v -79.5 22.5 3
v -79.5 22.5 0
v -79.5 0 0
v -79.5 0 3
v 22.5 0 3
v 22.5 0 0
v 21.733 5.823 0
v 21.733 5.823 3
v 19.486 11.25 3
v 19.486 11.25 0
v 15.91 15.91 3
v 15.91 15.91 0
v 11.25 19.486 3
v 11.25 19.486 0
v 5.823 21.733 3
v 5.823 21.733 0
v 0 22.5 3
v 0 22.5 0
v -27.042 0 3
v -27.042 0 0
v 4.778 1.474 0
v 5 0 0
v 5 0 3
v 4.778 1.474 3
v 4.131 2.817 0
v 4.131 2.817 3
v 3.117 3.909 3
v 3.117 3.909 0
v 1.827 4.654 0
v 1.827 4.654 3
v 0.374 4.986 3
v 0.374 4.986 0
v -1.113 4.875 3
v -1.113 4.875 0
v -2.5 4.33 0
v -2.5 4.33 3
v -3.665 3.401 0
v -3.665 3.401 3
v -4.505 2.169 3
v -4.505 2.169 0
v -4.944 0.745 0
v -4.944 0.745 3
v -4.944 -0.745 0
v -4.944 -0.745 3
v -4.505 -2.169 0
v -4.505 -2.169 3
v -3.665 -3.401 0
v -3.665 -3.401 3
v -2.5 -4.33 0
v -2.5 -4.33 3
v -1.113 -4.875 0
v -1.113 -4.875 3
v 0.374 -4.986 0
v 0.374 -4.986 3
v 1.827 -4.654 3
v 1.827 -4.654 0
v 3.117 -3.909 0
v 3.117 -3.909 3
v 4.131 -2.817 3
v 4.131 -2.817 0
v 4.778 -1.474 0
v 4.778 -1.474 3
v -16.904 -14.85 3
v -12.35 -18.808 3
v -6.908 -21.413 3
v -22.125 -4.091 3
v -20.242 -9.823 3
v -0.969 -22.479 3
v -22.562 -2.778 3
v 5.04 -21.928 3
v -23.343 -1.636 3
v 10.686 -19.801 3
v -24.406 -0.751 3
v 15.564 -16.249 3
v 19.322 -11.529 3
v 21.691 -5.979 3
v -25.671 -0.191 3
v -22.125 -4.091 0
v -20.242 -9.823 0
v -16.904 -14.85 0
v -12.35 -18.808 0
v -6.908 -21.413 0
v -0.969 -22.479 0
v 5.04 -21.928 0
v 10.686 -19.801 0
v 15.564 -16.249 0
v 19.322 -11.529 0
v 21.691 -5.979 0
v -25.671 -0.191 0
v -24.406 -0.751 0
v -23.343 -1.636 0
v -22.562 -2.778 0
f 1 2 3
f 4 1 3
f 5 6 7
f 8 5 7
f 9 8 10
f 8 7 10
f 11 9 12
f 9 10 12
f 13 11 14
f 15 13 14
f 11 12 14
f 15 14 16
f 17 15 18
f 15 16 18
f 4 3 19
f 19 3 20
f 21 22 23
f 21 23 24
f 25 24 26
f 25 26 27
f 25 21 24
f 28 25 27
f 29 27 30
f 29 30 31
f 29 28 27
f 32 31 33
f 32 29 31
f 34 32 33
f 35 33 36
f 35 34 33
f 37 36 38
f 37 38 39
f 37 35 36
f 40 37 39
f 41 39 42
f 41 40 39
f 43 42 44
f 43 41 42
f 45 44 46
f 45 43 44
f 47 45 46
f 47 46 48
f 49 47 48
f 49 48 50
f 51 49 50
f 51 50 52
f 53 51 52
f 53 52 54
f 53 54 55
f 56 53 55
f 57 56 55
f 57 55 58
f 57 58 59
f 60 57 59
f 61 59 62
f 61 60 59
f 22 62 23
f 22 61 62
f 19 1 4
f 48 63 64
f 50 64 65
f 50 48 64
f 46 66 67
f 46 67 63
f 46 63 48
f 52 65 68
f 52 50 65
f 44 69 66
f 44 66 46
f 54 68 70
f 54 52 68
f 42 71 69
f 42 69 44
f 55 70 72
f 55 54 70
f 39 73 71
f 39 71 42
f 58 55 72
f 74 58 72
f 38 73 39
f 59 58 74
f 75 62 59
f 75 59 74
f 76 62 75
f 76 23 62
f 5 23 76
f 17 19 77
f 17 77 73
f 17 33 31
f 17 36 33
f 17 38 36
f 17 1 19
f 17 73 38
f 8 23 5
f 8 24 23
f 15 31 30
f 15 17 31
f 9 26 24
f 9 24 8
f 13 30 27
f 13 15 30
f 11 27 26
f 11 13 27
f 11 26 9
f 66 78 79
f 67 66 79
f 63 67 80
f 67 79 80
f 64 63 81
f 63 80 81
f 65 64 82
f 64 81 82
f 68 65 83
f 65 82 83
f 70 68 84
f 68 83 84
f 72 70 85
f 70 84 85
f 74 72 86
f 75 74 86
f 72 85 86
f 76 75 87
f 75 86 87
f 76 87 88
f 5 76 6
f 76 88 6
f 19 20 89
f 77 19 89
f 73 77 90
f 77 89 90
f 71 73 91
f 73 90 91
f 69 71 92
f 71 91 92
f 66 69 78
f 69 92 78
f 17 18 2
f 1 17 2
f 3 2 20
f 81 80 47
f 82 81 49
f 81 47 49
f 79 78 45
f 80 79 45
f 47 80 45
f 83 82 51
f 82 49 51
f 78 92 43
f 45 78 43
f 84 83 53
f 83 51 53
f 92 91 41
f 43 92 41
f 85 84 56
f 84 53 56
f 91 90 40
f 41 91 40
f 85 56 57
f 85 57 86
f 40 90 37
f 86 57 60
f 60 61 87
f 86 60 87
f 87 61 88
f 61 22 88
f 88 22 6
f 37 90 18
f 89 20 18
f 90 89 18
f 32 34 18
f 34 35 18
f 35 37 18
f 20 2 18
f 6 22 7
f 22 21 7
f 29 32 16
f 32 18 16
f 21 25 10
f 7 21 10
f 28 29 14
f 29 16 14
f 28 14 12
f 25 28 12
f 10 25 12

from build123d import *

# Parameters (mm, degrees)
SKETCH1_R           = 5
BOSS_EXTRUDE2_DEPTH = 3


with BuildPart() as part:
    # Sketch1 → Boss-Extrude2 (new body)
    # profile 1 of 6: a face of its own
    with BuildSketch(Plane.XY):
        with BuildLine():
            ThreePointArc((22.5, 0), (15.909902577, 15.909902577), (0, 22.5))
            Line((0, 22.5), (-22.5, 0))
            Line((-22.5, 0), (-22.124973736, -4.090909091))
            ThreePointArc((-22.124973736, -4.090909091), (2.054031517, -22.406047276), (22.5, 0))
        make_face()
        Circle(SKETCH1_R, mode=Mode.SUBTRACT)
    # profile 2 of 6: a face of its own
    with BuildSketch(Plane.XY):
        with BuildLine():
            ThreePointArc((-22.5, 0), (-15.909902577, 15.909902577), (0, 22.5))
            Line((0, 22.5), (-22.5, 22.5))
            Line((-22.5, 22.5), (-22.5, 0))
        make_face()
    # profile 3 of 6: a face of its own
    with BuildSketch(Plane.XY):
        with BuildLine():
            Line((-22.5, 0), (0, 22.5))
            ThreePointArc((0, 22.5), (-15.909902577, 15.909902577), (-22.5, 0))
        make_face()
    # profile 4 of 6: a face of its own
    with BuildSketch(Plane.XY):
        Polygon((-27.041634566, 0), (-22.5, 0), (-22.5, 22.5), (-79.5, 22.5), (-79.5, 0), align=None)
    # profile 5 of 6: a face of its own
    with BuildSketch(Plane.XY):
        with BuildLine():
            ThreePointArc((-22.124973736, -4.090909091), (-22.406047276, -2.054031517), (-22.5, 0))
            Line((-22.5, 0), (-27.041634566, 0))
            ThreePointArc((-27.041634566, 0), (-23.843623821, -1.156469426), (-22.124973736, -4.090909091))
        make_face()
    # profile 6 of 6: a face of its own
    with BuildSketch(Plane.XY):
        with BuildLine():
            Line((-22.124973736, -4.090909091), (-22.5, 0))
            ThreePointArc((-22.5, 0), (-22.406047276, -2.054031517), (-22.124973736, -4.090909091))
        make_face()
    extrude(amount=BOSS_EXTRUDE2_DEPTH)


solid = part.part
